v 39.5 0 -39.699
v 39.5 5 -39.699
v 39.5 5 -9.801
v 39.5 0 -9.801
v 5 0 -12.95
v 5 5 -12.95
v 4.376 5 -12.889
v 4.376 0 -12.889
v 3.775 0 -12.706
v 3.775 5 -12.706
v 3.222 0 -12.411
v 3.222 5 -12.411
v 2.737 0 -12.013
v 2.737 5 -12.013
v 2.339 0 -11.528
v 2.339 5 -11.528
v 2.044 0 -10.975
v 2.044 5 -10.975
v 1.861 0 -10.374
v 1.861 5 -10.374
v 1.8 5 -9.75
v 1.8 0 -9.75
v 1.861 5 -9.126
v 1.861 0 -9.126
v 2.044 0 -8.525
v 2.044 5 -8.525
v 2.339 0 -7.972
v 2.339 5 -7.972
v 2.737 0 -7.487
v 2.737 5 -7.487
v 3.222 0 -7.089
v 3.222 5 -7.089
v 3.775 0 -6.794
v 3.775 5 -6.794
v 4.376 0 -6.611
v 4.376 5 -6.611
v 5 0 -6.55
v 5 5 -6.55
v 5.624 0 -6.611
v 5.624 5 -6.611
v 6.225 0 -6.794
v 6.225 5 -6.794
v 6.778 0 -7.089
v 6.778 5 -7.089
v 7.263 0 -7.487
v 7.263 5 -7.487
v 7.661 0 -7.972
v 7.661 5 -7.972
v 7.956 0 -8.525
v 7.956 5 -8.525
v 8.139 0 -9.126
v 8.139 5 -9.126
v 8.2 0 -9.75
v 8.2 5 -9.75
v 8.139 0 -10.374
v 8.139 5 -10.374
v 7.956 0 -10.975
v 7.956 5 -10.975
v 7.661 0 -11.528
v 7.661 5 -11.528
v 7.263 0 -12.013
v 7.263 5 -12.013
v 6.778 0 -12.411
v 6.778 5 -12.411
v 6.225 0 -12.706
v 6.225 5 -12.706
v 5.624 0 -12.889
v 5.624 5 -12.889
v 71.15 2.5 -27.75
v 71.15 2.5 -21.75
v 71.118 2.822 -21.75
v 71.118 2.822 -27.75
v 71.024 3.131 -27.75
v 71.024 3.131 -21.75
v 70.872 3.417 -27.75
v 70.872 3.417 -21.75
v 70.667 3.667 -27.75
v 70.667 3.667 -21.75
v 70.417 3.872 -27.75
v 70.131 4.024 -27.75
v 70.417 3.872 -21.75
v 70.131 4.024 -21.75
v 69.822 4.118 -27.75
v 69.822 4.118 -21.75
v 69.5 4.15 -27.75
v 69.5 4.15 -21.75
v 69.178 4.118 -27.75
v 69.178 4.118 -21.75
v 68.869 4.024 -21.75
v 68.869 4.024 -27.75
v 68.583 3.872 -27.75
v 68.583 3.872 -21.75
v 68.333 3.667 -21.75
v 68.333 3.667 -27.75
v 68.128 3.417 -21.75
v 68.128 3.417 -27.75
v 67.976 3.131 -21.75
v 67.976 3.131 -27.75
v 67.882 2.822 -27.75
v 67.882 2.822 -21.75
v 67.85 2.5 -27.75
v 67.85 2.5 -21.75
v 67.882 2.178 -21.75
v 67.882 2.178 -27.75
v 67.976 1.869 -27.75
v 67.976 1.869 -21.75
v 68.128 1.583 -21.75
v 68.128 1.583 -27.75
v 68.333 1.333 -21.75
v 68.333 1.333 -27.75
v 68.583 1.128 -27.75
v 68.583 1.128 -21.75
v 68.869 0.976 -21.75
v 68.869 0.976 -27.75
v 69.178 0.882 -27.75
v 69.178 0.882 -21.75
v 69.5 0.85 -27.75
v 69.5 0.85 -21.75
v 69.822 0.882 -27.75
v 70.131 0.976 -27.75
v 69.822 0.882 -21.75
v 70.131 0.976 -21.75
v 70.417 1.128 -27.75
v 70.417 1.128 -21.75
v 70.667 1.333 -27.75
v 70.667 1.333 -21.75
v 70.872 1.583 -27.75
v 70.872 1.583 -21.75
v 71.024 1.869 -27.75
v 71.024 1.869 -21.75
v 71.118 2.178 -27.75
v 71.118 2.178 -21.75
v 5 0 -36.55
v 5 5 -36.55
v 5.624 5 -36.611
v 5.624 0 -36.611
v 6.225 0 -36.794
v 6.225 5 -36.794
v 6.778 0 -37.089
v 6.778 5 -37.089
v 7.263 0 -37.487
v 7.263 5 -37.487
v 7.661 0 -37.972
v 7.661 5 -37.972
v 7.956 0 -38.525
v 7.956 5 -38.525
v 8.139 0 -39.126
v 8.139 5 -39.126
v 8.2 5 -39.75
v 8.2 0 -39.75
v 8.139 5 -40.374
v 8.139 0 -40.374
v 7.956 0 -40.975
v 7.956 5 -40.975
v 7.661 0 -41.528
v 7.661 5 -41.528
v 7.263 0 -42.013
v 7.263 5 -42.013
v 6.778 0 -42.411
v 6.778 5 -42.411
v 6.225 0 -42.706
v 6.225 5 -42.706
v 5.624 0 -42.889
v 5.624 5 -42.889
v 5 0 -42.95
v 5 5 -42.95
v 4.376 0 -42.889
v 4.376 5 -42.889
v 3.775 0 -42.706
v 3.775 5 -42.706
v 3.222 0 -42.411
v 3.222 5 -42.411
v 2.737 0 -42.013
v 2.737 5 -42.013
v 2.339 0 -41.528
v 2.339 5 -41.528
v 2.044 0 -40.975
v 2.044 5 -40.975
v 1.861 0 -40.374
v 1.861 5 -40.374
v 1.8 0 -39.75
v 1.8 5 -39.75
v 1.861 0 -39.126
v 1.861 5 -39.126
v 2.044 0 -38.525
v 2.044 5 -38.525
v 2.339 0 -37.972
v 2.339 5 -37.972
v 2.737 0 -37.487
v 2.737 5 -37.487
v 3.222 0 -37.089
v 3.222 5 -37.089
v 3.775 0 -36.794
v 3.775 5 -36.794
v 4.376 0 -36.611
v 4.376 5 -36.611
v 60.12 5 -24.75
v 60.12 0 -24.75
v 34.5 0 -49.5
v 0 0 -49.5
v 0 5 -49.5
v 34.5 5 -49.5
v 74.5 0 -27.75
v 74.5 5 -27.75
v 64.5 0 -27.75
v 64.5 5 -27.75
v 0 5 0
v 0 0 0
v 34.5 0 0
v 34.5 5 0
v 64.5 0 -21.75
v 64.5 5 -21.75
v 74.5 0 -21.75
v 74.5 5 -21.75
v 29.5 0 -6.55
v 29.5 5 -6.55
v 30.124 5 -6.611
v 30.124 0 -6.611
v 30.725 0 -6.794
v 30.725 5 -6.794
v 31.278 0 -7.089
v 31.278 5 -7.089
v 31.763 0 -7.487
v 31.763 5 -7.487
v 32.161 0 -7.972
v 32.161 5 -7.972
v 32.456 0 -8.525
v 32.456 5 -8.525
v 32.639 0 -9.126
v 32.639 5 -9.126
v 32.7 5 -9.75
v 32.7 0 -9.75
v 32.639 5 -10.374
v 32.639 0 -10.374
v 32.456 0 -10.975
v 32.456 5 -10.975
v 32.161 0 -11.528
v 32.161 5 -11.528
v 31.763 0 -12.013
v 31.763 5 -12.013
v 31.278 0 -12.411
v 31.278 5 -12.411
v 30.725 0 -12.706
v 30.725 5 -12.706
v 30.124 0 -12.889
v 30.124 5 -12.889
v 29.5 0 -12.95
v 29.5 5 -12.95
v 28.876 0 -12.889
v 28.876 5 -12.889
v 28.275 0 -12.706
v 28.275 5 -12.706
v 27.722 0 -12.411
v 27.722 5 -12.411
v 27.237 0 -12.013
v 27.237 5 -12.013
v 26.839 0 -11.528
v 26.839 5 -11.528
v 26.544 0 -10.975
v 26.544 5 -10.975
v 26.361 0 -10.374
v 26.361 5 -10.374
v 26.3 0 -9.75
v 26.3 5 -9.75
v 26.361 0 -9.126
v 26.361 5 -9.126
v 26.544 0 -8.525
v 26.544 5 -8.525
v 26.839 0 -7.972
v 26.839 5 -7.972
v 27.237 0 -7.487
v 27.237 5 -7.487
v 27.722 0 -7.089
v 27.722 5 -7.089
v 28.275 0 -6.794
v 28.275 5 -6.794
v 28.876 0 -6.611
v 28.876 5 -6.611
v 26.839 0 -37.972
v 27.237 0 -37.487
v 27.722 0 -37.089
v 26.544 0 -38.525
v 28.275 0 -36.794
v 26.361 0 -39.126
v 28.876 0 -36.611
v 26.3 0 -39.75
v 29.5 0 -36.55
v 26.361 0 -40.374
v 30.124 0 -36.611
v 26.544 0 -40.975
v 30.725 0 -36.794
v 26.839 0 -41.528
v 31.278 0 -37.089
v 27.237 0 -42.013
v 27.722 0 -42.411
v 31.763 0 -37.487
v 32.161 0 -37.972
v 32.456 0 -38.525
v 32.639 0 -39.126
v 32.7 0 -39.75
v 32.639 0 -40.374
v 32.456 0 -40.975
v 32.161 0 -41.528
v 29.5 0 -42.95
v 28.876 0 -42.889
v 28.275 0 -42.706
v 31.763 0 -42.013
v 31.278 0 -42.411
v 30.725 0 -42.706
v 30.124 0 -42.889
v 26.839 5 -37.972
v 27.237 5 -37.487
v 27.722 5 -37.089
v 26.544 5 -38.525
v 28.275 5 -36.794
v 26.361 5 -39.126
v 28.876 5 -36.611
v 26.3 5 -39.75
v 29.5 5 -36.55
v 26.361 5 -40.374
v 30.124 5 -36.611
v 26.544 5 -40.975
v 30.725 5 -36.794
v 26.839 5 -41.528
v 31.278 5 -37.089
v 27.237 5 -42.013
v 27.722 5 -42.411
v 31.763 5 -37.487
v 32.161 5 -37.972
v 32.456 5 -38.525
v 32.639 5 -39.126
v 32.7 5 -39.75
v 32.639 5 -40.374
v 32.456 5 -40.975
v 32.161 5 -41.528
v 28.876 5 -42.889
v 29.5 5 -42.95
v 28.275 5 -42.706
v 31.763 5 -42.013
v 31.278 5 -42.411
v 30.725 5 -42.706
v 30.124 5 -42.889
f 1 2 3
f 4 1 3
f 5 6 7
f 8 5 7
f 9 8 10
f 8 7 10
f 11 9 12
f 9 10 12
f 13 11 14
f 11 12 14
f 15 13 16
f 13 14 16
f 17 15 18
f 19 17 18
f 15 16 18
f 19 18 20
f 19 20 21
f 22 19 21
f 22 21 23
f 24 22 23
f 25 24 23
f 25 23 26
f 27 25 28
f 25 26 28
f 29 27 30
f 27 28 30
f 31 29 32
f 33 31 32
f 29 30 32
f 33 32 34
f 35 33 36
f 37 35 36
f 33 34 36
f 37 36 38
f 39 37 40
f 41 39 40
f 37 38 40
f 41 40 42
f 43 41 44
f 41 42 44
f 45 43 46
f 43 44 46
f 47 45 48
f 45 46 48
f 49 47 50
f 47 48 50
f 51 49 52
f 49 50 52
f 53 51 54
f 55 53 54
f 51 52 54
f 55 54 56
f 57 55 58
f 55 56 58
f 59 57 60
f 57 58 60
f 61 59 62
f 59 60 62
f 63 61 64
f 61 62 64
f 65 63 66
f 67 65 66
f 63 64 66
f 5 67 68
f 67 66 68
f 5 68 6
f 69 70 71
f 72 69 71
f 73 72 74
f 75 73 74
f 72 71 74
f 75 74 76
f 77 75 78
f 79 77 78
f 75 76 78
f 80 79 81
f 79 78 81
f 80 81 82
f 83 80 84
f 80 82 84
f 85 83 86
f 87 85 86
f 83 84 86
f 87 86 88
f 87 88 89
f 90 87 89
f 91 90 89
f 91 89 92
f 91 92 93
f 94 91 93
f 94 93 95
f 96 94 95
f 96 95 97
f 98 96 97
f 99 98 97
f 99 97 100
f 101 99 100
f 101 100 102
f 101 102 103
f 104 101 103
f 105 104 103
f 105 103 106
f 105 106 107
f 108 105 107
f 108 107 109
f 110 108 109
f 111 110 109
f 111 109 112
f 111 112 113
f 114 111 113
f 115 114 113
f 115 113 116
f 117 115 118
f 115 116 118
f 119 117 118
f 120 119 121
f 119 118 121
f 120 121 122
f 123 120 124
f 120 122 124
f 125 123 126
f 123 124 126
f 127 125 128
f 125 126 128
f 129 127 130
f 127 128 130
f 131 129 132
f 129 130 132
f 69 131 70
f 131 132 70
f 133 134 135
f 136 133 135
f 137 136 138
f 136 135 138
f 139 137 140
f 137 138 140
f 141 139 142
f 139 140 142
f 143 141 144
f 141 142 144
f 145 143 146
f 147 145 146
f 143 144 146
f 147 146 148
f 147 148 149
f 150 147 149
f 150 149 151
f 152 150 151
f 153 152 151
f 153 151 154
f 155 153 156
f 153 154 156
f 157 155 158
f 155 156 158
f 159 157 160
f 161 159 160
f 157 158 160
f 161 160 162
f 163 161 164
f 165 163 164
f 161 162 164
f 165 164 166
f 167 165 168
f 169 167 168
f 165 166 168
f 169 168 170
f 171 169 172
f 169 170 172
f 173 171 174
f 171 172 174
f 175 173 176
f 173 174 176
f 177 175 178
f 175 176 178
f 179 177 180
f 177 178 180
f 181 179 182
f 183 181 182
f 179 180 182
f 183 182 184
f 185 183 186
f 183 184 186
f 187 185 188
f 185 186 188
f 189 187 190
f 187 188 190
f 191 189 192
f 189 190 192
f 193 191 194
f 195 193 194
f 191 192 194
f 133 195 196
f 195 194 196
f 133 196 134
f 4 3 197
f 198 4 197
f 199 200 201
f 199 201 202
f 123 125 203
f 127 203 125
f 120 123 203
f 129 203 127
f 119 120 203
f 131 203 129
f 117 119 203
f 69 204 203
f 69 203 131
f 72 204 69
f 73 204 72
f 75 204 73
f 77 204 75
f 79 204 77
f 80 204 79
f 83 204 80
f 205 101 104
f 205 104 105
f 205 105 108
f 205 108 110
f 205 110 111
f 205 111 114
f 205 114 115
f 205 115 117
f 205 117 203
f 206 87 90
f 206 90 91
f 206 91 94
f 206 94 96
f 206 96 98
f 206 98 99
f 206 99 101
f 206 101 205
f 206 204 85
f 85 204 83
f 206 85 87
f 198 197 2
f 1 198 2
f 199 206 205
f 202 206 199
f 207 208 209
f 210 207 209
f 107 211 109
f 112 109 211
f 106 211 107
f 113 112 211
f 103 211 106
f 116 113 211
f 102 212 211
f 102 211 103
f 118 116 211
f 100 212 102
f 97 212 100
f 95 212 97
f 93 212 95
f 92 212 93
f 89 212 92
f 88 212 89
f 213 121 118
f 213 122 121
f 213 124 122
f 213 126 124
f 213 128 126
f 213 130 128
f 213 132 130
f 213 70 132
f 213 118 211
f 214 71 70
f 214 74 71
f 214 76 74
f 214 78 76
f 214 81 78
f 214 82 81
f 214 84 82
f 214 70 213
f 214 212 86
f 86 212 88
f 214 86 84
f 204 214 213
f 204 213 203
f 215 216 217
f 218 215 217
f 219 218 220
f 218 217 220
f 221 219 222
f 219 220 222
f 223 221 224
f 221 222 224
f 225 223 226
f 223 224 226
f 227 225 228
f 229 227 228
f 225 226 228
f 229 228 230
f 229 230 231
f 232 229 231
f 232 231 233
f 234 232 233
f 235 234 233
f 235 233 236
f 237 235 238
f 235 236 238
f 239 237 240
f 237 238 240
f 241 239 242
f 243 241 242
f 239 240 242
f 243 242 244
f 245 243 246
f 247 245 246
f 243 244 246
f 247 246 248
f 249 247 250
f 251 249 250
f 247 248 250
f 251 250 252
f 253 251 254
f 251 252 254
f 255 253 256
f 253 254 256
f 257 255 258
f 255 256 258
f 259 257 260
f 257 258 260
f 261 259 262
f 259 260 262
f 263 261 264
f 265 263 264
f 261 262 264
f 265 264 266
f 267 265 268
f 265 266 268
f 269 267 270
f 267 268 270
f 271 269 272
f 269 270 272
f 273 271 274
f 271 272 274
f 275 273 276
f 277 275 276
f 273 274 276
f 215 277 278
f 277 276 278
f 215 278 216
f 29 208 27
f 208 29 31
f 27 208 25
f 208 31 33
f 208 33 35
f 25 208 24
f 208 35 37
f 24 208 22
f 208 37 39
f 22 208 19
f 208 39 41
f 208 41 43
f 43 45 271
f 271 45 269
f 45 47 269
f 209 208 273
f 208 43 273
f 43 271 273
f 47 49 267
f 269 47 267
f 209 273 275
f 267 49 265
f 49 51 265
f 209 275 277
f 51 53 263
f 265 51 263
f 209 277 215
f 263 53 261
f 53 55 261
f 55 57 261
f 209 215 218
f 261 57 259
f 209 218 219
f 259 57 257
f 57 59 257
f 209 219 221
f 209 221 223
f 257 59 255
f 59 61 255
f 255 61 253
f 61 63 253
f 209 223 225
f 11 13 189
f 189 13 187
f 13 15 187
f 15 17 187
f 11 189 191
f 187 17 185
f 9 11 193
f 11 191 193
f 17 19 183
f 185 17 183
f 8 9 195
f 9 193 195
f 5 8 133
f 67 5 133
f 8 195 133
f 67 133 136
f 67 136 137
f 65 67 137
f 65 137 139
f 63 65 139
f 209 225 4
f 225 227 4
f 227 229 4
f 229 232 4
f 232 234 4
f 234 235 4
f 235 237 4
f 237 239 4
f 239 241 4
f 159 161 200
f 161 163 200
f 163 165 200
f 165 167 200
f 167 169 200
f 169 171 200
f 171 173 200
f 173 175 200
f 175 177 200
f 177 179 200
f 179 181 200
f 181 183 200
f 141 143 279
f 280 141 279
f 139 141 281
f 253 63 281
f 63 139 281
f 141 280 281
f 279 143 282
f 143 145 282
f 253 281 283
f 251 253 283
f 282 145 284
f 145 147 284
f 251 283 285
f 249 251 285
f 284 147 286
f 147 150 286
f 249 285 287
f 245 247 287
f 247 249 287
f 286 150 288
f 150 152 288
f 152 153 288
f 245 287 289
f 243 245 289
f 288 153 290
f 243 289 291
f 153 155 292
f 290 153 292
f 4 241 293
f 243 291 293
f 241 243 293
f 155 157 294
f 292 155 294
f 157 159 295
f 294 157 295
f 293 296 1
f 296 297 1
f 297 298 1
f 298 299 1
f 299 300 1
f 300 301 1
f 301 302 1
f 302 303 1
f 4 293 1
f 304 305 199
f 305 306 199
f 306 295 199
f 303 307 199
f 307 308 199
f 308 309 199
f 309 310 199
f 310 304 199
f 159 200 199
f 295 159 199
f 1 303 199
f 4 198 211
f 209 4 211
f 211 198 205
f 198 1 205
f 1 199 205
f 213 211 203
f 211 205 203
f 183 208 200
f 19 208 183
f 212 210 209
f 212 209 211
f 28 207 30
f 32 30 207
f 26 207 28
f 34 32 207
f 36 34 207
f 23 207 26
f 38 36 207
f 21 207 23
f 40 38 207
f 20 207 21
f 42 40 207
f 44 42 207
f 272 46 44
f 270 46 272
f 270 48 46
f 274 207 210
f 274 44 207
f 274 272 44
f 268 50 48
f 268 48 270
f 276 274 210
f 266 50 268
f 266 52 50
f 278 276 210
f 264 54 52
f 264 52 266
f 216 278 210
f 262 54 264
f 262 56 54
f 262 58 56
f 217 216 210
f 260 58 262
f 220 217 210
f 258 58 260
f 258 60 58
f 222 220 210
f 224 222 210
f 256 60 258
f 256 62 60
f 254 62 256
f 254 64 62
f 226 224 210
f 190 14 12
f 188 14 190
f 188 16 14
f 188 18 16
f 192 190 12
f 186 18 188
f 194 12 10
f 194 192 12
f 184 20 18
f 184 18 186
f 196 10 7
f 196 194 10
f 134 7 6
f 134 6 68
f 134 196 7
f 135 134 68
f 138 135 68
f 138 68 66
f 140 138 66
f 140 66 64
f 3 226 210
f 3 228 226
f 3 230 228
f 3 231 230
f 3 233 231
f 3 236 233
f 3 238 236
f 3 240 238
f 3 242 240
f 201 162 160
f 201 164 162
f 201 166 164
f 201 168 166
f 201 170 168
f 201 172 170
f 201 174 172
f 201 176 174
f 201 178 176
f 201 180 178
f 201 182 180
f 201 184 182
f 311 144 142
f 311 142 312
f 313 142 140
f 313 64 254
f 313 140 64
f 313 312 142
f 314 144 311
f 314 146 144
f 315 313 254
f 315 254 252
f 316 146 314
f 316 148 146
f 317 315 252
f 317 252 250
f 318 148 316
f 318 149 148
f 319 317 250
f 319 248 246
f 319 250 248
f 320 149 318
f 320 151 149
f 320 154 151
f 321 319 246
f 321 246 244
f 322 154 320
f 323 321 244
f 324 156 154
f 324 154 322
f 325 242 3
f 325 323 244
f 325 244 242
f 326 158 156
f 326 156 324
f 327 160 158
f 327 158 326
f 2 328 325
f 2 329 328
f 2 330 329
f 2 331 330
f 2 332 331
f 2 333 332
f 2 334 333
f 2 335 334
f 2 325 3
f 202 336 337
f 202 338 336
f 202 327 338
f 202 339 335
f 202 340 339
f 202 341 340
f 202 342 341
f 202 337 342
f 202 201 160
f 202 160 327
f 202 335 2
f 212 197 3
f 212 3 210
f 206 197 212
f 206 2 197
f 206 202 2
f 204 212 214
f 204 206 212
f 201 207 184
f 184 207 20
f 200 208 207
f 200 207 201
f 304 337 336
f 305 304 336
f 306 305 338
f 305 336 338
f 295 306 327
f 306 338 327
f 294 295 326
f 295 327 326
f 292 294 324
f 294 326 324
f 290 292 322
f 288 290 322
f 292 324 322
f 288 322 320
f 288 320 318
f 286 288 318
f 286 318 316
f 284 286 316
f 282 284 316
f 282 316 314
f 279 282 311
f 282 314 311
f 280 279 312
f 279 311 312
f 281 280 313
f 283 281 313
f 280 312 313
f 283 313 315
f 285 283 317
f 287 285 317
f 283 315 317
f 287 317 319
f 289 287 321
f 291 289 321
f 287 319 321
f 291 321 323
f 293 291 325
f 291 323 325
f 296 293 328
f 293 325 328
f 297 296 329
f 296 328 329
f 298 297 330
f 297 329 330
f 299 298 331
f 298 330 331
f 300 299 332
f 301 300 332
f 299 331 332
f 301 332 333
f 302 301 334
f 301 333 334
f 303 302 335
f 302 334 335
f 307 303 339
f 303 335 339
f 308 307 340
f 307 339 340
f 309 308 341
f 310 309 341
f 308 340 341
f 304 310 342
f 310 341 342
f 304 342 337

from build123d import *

# Parameters (mm, degrees)
SKETCH1_W           = 34.5
SKETCH1_H           = 49.5
BOSS_EXTRUDE1_DEPTH = 5
SKETCH2_R           = 3.2
CUT_EXTRUDE1_DEPTH  = 5
SKETCH3_W           = 6
SKETCH3_H           = 25
BOSS_EXTRUDE2_DEPTH = 5
FILLET1_R           = 10
FILLET2_R           = 5
SKETCH6_W           = 166.1846994
SKETCH6_H           = 49.5
CUT_EXTRUDE3_DEPTH  = 10
BOSS_EXTRUDE3_DEPTH = 5
SKETCH8_R           = 1.65
CUT_EXTRUDE4_DEPTH  = 10


with BuildPart() as part:
    # Sketch1 → Boss-Extrude1 (new body)
    with BuildSketch(Plane(origin=(0, 0, 0), x_dir=(1, 0, 0), z_dir=(0, 1, 0))):
        with Locations((17.25, 24.75)):
            Rectangle(SKETCH1_W, SKETCH1_H)
    extrude(amount=BOSS_EXTRUDE1_DEPTH)

    # Sketch2 → Cut-Extrude1 (cut)
    with BuildSketch(Plane(origin=(0, 5, 0), x_dir=(1, 0, 0), z_dir=(0, 1, 0))):
        with Locations(Location((5, 39.75, 0), (0, 0, 270))):
            Circle(SKETCH2_R)
        with Locations(Location((5, 9.75, 0), (0, 0, 90))):
            Circle(SKETCH2_R)
        with Locations(Location((29.5, 9.75, 0), (0, 0, 270))):
            Circle(SKETCH2_R)
        with Locations(Location((29.5, 39.75, 0), (0, 0, 90))):
            Circle(SKETCH2_R)
    extrude(amount=-CUT_EXTRUDE1_DEPTH, mode=Mode.SUBTRACT)

    # Sketch3 → Boss-Extrude2 (add)
    with BuildSketch(Plane(origin=(0, 5, 0), x_dir=(1, 0, 0), z_dir=(0, 1, 0))):
        Polygon((189.75, 42.25), (34.5, 49.5), (34.5, 41.491281612), (84.094915791, 39.175254948), (84.094915791, 10.324745052), (34.5, 8.008718388), (34.5, 0), (189.75, 7.25), align=None)
        Polygon((171.053500921, 14.385612956), (89.094915791, 10.558239416), (89.094915791, 38.941760584), (171.053500921, 35.114387044), align=None, mode=Mode.SUBTRACT)
        with Locations((181.13, 24.75)):
            Rectangle(SKETCH3_W, SKETCH3_H, mode=Mode.SUBTRACT)
    extrude(amount=-BOSS_EXTRUDE2_DEPTH)

    # Fillet1
    fillet1_edges = [part.edges().sort_by_distance(p)[0] for p in [
        (34.5, 2.5, -8.008718388),
        (84.094915791, 2.5, -10.324745052),
        (84.094915791, 2.5, -39.175254948),
        (34.5, 2.5, -41.491281612),
        (89.094915791, 2.5, -38.941760584),
        (89.094915791, 2.5, -10.558239416),
    ]]
    fillet(fillet1_edges, radius=FILLET1_R)

    # Fillet2
    fillet2_edges = [part.edges().sort_by_distance(p)[0] for p in [
        (171.053500921, 2.5, -35.114387044),
        (171.053500921, 2.5, -14.385612956),
    ]]
    fillet(fillet2_edges, radius=FILLET2_R)

    # Sketch6 → Cut-Extrude3 (cut)
    with BuildSketch(Plane(origin=(0, 5, 0), x_dir=(1, 0, 0), z_dir=(0, 1, 0))):
        with Locations((117.5923497, 24.75)):
            Rectangle(SKETCH6_W, SKETCH6_H)
    extrude(amount=-CUT_EXTRUDE3_DEPTH, mode=Mode.SUBTRACT)

    # Sketch7 → Boss-Extrude3 (add)
    with BuildSketch(Plane(origin=(0, 5, 0), x_dir=(1, 0, 0), z_dir=(0, 1, 0))):
        Polygon((64.5, 27.75), (34.5, 49.5), (34.5, 0), (64.5, 21.75), (74.5, 21.75), (74.5, 27.75), align=None)
        Polygon((60.119572878, 24.75), (39.5, 39.699190336), (39.5, 9.800809664), align=None, mode=Mode.SUBTRACT)
    extrude(amount=-BOSS_EXTRUDE3_DEPTH)

    # Sketch8 → Cut-Extrude4 (cut)
    with BuildSketch(Plane.XY.offset(-21.75)):
        with Locations((69.5, 2.5)):
            Circle(SKETCH8_R)
    extrude(amount=-CUT_EXTRUDE4_DEPTH, mode=Mode.SUBTRACT)


solid = part.part
